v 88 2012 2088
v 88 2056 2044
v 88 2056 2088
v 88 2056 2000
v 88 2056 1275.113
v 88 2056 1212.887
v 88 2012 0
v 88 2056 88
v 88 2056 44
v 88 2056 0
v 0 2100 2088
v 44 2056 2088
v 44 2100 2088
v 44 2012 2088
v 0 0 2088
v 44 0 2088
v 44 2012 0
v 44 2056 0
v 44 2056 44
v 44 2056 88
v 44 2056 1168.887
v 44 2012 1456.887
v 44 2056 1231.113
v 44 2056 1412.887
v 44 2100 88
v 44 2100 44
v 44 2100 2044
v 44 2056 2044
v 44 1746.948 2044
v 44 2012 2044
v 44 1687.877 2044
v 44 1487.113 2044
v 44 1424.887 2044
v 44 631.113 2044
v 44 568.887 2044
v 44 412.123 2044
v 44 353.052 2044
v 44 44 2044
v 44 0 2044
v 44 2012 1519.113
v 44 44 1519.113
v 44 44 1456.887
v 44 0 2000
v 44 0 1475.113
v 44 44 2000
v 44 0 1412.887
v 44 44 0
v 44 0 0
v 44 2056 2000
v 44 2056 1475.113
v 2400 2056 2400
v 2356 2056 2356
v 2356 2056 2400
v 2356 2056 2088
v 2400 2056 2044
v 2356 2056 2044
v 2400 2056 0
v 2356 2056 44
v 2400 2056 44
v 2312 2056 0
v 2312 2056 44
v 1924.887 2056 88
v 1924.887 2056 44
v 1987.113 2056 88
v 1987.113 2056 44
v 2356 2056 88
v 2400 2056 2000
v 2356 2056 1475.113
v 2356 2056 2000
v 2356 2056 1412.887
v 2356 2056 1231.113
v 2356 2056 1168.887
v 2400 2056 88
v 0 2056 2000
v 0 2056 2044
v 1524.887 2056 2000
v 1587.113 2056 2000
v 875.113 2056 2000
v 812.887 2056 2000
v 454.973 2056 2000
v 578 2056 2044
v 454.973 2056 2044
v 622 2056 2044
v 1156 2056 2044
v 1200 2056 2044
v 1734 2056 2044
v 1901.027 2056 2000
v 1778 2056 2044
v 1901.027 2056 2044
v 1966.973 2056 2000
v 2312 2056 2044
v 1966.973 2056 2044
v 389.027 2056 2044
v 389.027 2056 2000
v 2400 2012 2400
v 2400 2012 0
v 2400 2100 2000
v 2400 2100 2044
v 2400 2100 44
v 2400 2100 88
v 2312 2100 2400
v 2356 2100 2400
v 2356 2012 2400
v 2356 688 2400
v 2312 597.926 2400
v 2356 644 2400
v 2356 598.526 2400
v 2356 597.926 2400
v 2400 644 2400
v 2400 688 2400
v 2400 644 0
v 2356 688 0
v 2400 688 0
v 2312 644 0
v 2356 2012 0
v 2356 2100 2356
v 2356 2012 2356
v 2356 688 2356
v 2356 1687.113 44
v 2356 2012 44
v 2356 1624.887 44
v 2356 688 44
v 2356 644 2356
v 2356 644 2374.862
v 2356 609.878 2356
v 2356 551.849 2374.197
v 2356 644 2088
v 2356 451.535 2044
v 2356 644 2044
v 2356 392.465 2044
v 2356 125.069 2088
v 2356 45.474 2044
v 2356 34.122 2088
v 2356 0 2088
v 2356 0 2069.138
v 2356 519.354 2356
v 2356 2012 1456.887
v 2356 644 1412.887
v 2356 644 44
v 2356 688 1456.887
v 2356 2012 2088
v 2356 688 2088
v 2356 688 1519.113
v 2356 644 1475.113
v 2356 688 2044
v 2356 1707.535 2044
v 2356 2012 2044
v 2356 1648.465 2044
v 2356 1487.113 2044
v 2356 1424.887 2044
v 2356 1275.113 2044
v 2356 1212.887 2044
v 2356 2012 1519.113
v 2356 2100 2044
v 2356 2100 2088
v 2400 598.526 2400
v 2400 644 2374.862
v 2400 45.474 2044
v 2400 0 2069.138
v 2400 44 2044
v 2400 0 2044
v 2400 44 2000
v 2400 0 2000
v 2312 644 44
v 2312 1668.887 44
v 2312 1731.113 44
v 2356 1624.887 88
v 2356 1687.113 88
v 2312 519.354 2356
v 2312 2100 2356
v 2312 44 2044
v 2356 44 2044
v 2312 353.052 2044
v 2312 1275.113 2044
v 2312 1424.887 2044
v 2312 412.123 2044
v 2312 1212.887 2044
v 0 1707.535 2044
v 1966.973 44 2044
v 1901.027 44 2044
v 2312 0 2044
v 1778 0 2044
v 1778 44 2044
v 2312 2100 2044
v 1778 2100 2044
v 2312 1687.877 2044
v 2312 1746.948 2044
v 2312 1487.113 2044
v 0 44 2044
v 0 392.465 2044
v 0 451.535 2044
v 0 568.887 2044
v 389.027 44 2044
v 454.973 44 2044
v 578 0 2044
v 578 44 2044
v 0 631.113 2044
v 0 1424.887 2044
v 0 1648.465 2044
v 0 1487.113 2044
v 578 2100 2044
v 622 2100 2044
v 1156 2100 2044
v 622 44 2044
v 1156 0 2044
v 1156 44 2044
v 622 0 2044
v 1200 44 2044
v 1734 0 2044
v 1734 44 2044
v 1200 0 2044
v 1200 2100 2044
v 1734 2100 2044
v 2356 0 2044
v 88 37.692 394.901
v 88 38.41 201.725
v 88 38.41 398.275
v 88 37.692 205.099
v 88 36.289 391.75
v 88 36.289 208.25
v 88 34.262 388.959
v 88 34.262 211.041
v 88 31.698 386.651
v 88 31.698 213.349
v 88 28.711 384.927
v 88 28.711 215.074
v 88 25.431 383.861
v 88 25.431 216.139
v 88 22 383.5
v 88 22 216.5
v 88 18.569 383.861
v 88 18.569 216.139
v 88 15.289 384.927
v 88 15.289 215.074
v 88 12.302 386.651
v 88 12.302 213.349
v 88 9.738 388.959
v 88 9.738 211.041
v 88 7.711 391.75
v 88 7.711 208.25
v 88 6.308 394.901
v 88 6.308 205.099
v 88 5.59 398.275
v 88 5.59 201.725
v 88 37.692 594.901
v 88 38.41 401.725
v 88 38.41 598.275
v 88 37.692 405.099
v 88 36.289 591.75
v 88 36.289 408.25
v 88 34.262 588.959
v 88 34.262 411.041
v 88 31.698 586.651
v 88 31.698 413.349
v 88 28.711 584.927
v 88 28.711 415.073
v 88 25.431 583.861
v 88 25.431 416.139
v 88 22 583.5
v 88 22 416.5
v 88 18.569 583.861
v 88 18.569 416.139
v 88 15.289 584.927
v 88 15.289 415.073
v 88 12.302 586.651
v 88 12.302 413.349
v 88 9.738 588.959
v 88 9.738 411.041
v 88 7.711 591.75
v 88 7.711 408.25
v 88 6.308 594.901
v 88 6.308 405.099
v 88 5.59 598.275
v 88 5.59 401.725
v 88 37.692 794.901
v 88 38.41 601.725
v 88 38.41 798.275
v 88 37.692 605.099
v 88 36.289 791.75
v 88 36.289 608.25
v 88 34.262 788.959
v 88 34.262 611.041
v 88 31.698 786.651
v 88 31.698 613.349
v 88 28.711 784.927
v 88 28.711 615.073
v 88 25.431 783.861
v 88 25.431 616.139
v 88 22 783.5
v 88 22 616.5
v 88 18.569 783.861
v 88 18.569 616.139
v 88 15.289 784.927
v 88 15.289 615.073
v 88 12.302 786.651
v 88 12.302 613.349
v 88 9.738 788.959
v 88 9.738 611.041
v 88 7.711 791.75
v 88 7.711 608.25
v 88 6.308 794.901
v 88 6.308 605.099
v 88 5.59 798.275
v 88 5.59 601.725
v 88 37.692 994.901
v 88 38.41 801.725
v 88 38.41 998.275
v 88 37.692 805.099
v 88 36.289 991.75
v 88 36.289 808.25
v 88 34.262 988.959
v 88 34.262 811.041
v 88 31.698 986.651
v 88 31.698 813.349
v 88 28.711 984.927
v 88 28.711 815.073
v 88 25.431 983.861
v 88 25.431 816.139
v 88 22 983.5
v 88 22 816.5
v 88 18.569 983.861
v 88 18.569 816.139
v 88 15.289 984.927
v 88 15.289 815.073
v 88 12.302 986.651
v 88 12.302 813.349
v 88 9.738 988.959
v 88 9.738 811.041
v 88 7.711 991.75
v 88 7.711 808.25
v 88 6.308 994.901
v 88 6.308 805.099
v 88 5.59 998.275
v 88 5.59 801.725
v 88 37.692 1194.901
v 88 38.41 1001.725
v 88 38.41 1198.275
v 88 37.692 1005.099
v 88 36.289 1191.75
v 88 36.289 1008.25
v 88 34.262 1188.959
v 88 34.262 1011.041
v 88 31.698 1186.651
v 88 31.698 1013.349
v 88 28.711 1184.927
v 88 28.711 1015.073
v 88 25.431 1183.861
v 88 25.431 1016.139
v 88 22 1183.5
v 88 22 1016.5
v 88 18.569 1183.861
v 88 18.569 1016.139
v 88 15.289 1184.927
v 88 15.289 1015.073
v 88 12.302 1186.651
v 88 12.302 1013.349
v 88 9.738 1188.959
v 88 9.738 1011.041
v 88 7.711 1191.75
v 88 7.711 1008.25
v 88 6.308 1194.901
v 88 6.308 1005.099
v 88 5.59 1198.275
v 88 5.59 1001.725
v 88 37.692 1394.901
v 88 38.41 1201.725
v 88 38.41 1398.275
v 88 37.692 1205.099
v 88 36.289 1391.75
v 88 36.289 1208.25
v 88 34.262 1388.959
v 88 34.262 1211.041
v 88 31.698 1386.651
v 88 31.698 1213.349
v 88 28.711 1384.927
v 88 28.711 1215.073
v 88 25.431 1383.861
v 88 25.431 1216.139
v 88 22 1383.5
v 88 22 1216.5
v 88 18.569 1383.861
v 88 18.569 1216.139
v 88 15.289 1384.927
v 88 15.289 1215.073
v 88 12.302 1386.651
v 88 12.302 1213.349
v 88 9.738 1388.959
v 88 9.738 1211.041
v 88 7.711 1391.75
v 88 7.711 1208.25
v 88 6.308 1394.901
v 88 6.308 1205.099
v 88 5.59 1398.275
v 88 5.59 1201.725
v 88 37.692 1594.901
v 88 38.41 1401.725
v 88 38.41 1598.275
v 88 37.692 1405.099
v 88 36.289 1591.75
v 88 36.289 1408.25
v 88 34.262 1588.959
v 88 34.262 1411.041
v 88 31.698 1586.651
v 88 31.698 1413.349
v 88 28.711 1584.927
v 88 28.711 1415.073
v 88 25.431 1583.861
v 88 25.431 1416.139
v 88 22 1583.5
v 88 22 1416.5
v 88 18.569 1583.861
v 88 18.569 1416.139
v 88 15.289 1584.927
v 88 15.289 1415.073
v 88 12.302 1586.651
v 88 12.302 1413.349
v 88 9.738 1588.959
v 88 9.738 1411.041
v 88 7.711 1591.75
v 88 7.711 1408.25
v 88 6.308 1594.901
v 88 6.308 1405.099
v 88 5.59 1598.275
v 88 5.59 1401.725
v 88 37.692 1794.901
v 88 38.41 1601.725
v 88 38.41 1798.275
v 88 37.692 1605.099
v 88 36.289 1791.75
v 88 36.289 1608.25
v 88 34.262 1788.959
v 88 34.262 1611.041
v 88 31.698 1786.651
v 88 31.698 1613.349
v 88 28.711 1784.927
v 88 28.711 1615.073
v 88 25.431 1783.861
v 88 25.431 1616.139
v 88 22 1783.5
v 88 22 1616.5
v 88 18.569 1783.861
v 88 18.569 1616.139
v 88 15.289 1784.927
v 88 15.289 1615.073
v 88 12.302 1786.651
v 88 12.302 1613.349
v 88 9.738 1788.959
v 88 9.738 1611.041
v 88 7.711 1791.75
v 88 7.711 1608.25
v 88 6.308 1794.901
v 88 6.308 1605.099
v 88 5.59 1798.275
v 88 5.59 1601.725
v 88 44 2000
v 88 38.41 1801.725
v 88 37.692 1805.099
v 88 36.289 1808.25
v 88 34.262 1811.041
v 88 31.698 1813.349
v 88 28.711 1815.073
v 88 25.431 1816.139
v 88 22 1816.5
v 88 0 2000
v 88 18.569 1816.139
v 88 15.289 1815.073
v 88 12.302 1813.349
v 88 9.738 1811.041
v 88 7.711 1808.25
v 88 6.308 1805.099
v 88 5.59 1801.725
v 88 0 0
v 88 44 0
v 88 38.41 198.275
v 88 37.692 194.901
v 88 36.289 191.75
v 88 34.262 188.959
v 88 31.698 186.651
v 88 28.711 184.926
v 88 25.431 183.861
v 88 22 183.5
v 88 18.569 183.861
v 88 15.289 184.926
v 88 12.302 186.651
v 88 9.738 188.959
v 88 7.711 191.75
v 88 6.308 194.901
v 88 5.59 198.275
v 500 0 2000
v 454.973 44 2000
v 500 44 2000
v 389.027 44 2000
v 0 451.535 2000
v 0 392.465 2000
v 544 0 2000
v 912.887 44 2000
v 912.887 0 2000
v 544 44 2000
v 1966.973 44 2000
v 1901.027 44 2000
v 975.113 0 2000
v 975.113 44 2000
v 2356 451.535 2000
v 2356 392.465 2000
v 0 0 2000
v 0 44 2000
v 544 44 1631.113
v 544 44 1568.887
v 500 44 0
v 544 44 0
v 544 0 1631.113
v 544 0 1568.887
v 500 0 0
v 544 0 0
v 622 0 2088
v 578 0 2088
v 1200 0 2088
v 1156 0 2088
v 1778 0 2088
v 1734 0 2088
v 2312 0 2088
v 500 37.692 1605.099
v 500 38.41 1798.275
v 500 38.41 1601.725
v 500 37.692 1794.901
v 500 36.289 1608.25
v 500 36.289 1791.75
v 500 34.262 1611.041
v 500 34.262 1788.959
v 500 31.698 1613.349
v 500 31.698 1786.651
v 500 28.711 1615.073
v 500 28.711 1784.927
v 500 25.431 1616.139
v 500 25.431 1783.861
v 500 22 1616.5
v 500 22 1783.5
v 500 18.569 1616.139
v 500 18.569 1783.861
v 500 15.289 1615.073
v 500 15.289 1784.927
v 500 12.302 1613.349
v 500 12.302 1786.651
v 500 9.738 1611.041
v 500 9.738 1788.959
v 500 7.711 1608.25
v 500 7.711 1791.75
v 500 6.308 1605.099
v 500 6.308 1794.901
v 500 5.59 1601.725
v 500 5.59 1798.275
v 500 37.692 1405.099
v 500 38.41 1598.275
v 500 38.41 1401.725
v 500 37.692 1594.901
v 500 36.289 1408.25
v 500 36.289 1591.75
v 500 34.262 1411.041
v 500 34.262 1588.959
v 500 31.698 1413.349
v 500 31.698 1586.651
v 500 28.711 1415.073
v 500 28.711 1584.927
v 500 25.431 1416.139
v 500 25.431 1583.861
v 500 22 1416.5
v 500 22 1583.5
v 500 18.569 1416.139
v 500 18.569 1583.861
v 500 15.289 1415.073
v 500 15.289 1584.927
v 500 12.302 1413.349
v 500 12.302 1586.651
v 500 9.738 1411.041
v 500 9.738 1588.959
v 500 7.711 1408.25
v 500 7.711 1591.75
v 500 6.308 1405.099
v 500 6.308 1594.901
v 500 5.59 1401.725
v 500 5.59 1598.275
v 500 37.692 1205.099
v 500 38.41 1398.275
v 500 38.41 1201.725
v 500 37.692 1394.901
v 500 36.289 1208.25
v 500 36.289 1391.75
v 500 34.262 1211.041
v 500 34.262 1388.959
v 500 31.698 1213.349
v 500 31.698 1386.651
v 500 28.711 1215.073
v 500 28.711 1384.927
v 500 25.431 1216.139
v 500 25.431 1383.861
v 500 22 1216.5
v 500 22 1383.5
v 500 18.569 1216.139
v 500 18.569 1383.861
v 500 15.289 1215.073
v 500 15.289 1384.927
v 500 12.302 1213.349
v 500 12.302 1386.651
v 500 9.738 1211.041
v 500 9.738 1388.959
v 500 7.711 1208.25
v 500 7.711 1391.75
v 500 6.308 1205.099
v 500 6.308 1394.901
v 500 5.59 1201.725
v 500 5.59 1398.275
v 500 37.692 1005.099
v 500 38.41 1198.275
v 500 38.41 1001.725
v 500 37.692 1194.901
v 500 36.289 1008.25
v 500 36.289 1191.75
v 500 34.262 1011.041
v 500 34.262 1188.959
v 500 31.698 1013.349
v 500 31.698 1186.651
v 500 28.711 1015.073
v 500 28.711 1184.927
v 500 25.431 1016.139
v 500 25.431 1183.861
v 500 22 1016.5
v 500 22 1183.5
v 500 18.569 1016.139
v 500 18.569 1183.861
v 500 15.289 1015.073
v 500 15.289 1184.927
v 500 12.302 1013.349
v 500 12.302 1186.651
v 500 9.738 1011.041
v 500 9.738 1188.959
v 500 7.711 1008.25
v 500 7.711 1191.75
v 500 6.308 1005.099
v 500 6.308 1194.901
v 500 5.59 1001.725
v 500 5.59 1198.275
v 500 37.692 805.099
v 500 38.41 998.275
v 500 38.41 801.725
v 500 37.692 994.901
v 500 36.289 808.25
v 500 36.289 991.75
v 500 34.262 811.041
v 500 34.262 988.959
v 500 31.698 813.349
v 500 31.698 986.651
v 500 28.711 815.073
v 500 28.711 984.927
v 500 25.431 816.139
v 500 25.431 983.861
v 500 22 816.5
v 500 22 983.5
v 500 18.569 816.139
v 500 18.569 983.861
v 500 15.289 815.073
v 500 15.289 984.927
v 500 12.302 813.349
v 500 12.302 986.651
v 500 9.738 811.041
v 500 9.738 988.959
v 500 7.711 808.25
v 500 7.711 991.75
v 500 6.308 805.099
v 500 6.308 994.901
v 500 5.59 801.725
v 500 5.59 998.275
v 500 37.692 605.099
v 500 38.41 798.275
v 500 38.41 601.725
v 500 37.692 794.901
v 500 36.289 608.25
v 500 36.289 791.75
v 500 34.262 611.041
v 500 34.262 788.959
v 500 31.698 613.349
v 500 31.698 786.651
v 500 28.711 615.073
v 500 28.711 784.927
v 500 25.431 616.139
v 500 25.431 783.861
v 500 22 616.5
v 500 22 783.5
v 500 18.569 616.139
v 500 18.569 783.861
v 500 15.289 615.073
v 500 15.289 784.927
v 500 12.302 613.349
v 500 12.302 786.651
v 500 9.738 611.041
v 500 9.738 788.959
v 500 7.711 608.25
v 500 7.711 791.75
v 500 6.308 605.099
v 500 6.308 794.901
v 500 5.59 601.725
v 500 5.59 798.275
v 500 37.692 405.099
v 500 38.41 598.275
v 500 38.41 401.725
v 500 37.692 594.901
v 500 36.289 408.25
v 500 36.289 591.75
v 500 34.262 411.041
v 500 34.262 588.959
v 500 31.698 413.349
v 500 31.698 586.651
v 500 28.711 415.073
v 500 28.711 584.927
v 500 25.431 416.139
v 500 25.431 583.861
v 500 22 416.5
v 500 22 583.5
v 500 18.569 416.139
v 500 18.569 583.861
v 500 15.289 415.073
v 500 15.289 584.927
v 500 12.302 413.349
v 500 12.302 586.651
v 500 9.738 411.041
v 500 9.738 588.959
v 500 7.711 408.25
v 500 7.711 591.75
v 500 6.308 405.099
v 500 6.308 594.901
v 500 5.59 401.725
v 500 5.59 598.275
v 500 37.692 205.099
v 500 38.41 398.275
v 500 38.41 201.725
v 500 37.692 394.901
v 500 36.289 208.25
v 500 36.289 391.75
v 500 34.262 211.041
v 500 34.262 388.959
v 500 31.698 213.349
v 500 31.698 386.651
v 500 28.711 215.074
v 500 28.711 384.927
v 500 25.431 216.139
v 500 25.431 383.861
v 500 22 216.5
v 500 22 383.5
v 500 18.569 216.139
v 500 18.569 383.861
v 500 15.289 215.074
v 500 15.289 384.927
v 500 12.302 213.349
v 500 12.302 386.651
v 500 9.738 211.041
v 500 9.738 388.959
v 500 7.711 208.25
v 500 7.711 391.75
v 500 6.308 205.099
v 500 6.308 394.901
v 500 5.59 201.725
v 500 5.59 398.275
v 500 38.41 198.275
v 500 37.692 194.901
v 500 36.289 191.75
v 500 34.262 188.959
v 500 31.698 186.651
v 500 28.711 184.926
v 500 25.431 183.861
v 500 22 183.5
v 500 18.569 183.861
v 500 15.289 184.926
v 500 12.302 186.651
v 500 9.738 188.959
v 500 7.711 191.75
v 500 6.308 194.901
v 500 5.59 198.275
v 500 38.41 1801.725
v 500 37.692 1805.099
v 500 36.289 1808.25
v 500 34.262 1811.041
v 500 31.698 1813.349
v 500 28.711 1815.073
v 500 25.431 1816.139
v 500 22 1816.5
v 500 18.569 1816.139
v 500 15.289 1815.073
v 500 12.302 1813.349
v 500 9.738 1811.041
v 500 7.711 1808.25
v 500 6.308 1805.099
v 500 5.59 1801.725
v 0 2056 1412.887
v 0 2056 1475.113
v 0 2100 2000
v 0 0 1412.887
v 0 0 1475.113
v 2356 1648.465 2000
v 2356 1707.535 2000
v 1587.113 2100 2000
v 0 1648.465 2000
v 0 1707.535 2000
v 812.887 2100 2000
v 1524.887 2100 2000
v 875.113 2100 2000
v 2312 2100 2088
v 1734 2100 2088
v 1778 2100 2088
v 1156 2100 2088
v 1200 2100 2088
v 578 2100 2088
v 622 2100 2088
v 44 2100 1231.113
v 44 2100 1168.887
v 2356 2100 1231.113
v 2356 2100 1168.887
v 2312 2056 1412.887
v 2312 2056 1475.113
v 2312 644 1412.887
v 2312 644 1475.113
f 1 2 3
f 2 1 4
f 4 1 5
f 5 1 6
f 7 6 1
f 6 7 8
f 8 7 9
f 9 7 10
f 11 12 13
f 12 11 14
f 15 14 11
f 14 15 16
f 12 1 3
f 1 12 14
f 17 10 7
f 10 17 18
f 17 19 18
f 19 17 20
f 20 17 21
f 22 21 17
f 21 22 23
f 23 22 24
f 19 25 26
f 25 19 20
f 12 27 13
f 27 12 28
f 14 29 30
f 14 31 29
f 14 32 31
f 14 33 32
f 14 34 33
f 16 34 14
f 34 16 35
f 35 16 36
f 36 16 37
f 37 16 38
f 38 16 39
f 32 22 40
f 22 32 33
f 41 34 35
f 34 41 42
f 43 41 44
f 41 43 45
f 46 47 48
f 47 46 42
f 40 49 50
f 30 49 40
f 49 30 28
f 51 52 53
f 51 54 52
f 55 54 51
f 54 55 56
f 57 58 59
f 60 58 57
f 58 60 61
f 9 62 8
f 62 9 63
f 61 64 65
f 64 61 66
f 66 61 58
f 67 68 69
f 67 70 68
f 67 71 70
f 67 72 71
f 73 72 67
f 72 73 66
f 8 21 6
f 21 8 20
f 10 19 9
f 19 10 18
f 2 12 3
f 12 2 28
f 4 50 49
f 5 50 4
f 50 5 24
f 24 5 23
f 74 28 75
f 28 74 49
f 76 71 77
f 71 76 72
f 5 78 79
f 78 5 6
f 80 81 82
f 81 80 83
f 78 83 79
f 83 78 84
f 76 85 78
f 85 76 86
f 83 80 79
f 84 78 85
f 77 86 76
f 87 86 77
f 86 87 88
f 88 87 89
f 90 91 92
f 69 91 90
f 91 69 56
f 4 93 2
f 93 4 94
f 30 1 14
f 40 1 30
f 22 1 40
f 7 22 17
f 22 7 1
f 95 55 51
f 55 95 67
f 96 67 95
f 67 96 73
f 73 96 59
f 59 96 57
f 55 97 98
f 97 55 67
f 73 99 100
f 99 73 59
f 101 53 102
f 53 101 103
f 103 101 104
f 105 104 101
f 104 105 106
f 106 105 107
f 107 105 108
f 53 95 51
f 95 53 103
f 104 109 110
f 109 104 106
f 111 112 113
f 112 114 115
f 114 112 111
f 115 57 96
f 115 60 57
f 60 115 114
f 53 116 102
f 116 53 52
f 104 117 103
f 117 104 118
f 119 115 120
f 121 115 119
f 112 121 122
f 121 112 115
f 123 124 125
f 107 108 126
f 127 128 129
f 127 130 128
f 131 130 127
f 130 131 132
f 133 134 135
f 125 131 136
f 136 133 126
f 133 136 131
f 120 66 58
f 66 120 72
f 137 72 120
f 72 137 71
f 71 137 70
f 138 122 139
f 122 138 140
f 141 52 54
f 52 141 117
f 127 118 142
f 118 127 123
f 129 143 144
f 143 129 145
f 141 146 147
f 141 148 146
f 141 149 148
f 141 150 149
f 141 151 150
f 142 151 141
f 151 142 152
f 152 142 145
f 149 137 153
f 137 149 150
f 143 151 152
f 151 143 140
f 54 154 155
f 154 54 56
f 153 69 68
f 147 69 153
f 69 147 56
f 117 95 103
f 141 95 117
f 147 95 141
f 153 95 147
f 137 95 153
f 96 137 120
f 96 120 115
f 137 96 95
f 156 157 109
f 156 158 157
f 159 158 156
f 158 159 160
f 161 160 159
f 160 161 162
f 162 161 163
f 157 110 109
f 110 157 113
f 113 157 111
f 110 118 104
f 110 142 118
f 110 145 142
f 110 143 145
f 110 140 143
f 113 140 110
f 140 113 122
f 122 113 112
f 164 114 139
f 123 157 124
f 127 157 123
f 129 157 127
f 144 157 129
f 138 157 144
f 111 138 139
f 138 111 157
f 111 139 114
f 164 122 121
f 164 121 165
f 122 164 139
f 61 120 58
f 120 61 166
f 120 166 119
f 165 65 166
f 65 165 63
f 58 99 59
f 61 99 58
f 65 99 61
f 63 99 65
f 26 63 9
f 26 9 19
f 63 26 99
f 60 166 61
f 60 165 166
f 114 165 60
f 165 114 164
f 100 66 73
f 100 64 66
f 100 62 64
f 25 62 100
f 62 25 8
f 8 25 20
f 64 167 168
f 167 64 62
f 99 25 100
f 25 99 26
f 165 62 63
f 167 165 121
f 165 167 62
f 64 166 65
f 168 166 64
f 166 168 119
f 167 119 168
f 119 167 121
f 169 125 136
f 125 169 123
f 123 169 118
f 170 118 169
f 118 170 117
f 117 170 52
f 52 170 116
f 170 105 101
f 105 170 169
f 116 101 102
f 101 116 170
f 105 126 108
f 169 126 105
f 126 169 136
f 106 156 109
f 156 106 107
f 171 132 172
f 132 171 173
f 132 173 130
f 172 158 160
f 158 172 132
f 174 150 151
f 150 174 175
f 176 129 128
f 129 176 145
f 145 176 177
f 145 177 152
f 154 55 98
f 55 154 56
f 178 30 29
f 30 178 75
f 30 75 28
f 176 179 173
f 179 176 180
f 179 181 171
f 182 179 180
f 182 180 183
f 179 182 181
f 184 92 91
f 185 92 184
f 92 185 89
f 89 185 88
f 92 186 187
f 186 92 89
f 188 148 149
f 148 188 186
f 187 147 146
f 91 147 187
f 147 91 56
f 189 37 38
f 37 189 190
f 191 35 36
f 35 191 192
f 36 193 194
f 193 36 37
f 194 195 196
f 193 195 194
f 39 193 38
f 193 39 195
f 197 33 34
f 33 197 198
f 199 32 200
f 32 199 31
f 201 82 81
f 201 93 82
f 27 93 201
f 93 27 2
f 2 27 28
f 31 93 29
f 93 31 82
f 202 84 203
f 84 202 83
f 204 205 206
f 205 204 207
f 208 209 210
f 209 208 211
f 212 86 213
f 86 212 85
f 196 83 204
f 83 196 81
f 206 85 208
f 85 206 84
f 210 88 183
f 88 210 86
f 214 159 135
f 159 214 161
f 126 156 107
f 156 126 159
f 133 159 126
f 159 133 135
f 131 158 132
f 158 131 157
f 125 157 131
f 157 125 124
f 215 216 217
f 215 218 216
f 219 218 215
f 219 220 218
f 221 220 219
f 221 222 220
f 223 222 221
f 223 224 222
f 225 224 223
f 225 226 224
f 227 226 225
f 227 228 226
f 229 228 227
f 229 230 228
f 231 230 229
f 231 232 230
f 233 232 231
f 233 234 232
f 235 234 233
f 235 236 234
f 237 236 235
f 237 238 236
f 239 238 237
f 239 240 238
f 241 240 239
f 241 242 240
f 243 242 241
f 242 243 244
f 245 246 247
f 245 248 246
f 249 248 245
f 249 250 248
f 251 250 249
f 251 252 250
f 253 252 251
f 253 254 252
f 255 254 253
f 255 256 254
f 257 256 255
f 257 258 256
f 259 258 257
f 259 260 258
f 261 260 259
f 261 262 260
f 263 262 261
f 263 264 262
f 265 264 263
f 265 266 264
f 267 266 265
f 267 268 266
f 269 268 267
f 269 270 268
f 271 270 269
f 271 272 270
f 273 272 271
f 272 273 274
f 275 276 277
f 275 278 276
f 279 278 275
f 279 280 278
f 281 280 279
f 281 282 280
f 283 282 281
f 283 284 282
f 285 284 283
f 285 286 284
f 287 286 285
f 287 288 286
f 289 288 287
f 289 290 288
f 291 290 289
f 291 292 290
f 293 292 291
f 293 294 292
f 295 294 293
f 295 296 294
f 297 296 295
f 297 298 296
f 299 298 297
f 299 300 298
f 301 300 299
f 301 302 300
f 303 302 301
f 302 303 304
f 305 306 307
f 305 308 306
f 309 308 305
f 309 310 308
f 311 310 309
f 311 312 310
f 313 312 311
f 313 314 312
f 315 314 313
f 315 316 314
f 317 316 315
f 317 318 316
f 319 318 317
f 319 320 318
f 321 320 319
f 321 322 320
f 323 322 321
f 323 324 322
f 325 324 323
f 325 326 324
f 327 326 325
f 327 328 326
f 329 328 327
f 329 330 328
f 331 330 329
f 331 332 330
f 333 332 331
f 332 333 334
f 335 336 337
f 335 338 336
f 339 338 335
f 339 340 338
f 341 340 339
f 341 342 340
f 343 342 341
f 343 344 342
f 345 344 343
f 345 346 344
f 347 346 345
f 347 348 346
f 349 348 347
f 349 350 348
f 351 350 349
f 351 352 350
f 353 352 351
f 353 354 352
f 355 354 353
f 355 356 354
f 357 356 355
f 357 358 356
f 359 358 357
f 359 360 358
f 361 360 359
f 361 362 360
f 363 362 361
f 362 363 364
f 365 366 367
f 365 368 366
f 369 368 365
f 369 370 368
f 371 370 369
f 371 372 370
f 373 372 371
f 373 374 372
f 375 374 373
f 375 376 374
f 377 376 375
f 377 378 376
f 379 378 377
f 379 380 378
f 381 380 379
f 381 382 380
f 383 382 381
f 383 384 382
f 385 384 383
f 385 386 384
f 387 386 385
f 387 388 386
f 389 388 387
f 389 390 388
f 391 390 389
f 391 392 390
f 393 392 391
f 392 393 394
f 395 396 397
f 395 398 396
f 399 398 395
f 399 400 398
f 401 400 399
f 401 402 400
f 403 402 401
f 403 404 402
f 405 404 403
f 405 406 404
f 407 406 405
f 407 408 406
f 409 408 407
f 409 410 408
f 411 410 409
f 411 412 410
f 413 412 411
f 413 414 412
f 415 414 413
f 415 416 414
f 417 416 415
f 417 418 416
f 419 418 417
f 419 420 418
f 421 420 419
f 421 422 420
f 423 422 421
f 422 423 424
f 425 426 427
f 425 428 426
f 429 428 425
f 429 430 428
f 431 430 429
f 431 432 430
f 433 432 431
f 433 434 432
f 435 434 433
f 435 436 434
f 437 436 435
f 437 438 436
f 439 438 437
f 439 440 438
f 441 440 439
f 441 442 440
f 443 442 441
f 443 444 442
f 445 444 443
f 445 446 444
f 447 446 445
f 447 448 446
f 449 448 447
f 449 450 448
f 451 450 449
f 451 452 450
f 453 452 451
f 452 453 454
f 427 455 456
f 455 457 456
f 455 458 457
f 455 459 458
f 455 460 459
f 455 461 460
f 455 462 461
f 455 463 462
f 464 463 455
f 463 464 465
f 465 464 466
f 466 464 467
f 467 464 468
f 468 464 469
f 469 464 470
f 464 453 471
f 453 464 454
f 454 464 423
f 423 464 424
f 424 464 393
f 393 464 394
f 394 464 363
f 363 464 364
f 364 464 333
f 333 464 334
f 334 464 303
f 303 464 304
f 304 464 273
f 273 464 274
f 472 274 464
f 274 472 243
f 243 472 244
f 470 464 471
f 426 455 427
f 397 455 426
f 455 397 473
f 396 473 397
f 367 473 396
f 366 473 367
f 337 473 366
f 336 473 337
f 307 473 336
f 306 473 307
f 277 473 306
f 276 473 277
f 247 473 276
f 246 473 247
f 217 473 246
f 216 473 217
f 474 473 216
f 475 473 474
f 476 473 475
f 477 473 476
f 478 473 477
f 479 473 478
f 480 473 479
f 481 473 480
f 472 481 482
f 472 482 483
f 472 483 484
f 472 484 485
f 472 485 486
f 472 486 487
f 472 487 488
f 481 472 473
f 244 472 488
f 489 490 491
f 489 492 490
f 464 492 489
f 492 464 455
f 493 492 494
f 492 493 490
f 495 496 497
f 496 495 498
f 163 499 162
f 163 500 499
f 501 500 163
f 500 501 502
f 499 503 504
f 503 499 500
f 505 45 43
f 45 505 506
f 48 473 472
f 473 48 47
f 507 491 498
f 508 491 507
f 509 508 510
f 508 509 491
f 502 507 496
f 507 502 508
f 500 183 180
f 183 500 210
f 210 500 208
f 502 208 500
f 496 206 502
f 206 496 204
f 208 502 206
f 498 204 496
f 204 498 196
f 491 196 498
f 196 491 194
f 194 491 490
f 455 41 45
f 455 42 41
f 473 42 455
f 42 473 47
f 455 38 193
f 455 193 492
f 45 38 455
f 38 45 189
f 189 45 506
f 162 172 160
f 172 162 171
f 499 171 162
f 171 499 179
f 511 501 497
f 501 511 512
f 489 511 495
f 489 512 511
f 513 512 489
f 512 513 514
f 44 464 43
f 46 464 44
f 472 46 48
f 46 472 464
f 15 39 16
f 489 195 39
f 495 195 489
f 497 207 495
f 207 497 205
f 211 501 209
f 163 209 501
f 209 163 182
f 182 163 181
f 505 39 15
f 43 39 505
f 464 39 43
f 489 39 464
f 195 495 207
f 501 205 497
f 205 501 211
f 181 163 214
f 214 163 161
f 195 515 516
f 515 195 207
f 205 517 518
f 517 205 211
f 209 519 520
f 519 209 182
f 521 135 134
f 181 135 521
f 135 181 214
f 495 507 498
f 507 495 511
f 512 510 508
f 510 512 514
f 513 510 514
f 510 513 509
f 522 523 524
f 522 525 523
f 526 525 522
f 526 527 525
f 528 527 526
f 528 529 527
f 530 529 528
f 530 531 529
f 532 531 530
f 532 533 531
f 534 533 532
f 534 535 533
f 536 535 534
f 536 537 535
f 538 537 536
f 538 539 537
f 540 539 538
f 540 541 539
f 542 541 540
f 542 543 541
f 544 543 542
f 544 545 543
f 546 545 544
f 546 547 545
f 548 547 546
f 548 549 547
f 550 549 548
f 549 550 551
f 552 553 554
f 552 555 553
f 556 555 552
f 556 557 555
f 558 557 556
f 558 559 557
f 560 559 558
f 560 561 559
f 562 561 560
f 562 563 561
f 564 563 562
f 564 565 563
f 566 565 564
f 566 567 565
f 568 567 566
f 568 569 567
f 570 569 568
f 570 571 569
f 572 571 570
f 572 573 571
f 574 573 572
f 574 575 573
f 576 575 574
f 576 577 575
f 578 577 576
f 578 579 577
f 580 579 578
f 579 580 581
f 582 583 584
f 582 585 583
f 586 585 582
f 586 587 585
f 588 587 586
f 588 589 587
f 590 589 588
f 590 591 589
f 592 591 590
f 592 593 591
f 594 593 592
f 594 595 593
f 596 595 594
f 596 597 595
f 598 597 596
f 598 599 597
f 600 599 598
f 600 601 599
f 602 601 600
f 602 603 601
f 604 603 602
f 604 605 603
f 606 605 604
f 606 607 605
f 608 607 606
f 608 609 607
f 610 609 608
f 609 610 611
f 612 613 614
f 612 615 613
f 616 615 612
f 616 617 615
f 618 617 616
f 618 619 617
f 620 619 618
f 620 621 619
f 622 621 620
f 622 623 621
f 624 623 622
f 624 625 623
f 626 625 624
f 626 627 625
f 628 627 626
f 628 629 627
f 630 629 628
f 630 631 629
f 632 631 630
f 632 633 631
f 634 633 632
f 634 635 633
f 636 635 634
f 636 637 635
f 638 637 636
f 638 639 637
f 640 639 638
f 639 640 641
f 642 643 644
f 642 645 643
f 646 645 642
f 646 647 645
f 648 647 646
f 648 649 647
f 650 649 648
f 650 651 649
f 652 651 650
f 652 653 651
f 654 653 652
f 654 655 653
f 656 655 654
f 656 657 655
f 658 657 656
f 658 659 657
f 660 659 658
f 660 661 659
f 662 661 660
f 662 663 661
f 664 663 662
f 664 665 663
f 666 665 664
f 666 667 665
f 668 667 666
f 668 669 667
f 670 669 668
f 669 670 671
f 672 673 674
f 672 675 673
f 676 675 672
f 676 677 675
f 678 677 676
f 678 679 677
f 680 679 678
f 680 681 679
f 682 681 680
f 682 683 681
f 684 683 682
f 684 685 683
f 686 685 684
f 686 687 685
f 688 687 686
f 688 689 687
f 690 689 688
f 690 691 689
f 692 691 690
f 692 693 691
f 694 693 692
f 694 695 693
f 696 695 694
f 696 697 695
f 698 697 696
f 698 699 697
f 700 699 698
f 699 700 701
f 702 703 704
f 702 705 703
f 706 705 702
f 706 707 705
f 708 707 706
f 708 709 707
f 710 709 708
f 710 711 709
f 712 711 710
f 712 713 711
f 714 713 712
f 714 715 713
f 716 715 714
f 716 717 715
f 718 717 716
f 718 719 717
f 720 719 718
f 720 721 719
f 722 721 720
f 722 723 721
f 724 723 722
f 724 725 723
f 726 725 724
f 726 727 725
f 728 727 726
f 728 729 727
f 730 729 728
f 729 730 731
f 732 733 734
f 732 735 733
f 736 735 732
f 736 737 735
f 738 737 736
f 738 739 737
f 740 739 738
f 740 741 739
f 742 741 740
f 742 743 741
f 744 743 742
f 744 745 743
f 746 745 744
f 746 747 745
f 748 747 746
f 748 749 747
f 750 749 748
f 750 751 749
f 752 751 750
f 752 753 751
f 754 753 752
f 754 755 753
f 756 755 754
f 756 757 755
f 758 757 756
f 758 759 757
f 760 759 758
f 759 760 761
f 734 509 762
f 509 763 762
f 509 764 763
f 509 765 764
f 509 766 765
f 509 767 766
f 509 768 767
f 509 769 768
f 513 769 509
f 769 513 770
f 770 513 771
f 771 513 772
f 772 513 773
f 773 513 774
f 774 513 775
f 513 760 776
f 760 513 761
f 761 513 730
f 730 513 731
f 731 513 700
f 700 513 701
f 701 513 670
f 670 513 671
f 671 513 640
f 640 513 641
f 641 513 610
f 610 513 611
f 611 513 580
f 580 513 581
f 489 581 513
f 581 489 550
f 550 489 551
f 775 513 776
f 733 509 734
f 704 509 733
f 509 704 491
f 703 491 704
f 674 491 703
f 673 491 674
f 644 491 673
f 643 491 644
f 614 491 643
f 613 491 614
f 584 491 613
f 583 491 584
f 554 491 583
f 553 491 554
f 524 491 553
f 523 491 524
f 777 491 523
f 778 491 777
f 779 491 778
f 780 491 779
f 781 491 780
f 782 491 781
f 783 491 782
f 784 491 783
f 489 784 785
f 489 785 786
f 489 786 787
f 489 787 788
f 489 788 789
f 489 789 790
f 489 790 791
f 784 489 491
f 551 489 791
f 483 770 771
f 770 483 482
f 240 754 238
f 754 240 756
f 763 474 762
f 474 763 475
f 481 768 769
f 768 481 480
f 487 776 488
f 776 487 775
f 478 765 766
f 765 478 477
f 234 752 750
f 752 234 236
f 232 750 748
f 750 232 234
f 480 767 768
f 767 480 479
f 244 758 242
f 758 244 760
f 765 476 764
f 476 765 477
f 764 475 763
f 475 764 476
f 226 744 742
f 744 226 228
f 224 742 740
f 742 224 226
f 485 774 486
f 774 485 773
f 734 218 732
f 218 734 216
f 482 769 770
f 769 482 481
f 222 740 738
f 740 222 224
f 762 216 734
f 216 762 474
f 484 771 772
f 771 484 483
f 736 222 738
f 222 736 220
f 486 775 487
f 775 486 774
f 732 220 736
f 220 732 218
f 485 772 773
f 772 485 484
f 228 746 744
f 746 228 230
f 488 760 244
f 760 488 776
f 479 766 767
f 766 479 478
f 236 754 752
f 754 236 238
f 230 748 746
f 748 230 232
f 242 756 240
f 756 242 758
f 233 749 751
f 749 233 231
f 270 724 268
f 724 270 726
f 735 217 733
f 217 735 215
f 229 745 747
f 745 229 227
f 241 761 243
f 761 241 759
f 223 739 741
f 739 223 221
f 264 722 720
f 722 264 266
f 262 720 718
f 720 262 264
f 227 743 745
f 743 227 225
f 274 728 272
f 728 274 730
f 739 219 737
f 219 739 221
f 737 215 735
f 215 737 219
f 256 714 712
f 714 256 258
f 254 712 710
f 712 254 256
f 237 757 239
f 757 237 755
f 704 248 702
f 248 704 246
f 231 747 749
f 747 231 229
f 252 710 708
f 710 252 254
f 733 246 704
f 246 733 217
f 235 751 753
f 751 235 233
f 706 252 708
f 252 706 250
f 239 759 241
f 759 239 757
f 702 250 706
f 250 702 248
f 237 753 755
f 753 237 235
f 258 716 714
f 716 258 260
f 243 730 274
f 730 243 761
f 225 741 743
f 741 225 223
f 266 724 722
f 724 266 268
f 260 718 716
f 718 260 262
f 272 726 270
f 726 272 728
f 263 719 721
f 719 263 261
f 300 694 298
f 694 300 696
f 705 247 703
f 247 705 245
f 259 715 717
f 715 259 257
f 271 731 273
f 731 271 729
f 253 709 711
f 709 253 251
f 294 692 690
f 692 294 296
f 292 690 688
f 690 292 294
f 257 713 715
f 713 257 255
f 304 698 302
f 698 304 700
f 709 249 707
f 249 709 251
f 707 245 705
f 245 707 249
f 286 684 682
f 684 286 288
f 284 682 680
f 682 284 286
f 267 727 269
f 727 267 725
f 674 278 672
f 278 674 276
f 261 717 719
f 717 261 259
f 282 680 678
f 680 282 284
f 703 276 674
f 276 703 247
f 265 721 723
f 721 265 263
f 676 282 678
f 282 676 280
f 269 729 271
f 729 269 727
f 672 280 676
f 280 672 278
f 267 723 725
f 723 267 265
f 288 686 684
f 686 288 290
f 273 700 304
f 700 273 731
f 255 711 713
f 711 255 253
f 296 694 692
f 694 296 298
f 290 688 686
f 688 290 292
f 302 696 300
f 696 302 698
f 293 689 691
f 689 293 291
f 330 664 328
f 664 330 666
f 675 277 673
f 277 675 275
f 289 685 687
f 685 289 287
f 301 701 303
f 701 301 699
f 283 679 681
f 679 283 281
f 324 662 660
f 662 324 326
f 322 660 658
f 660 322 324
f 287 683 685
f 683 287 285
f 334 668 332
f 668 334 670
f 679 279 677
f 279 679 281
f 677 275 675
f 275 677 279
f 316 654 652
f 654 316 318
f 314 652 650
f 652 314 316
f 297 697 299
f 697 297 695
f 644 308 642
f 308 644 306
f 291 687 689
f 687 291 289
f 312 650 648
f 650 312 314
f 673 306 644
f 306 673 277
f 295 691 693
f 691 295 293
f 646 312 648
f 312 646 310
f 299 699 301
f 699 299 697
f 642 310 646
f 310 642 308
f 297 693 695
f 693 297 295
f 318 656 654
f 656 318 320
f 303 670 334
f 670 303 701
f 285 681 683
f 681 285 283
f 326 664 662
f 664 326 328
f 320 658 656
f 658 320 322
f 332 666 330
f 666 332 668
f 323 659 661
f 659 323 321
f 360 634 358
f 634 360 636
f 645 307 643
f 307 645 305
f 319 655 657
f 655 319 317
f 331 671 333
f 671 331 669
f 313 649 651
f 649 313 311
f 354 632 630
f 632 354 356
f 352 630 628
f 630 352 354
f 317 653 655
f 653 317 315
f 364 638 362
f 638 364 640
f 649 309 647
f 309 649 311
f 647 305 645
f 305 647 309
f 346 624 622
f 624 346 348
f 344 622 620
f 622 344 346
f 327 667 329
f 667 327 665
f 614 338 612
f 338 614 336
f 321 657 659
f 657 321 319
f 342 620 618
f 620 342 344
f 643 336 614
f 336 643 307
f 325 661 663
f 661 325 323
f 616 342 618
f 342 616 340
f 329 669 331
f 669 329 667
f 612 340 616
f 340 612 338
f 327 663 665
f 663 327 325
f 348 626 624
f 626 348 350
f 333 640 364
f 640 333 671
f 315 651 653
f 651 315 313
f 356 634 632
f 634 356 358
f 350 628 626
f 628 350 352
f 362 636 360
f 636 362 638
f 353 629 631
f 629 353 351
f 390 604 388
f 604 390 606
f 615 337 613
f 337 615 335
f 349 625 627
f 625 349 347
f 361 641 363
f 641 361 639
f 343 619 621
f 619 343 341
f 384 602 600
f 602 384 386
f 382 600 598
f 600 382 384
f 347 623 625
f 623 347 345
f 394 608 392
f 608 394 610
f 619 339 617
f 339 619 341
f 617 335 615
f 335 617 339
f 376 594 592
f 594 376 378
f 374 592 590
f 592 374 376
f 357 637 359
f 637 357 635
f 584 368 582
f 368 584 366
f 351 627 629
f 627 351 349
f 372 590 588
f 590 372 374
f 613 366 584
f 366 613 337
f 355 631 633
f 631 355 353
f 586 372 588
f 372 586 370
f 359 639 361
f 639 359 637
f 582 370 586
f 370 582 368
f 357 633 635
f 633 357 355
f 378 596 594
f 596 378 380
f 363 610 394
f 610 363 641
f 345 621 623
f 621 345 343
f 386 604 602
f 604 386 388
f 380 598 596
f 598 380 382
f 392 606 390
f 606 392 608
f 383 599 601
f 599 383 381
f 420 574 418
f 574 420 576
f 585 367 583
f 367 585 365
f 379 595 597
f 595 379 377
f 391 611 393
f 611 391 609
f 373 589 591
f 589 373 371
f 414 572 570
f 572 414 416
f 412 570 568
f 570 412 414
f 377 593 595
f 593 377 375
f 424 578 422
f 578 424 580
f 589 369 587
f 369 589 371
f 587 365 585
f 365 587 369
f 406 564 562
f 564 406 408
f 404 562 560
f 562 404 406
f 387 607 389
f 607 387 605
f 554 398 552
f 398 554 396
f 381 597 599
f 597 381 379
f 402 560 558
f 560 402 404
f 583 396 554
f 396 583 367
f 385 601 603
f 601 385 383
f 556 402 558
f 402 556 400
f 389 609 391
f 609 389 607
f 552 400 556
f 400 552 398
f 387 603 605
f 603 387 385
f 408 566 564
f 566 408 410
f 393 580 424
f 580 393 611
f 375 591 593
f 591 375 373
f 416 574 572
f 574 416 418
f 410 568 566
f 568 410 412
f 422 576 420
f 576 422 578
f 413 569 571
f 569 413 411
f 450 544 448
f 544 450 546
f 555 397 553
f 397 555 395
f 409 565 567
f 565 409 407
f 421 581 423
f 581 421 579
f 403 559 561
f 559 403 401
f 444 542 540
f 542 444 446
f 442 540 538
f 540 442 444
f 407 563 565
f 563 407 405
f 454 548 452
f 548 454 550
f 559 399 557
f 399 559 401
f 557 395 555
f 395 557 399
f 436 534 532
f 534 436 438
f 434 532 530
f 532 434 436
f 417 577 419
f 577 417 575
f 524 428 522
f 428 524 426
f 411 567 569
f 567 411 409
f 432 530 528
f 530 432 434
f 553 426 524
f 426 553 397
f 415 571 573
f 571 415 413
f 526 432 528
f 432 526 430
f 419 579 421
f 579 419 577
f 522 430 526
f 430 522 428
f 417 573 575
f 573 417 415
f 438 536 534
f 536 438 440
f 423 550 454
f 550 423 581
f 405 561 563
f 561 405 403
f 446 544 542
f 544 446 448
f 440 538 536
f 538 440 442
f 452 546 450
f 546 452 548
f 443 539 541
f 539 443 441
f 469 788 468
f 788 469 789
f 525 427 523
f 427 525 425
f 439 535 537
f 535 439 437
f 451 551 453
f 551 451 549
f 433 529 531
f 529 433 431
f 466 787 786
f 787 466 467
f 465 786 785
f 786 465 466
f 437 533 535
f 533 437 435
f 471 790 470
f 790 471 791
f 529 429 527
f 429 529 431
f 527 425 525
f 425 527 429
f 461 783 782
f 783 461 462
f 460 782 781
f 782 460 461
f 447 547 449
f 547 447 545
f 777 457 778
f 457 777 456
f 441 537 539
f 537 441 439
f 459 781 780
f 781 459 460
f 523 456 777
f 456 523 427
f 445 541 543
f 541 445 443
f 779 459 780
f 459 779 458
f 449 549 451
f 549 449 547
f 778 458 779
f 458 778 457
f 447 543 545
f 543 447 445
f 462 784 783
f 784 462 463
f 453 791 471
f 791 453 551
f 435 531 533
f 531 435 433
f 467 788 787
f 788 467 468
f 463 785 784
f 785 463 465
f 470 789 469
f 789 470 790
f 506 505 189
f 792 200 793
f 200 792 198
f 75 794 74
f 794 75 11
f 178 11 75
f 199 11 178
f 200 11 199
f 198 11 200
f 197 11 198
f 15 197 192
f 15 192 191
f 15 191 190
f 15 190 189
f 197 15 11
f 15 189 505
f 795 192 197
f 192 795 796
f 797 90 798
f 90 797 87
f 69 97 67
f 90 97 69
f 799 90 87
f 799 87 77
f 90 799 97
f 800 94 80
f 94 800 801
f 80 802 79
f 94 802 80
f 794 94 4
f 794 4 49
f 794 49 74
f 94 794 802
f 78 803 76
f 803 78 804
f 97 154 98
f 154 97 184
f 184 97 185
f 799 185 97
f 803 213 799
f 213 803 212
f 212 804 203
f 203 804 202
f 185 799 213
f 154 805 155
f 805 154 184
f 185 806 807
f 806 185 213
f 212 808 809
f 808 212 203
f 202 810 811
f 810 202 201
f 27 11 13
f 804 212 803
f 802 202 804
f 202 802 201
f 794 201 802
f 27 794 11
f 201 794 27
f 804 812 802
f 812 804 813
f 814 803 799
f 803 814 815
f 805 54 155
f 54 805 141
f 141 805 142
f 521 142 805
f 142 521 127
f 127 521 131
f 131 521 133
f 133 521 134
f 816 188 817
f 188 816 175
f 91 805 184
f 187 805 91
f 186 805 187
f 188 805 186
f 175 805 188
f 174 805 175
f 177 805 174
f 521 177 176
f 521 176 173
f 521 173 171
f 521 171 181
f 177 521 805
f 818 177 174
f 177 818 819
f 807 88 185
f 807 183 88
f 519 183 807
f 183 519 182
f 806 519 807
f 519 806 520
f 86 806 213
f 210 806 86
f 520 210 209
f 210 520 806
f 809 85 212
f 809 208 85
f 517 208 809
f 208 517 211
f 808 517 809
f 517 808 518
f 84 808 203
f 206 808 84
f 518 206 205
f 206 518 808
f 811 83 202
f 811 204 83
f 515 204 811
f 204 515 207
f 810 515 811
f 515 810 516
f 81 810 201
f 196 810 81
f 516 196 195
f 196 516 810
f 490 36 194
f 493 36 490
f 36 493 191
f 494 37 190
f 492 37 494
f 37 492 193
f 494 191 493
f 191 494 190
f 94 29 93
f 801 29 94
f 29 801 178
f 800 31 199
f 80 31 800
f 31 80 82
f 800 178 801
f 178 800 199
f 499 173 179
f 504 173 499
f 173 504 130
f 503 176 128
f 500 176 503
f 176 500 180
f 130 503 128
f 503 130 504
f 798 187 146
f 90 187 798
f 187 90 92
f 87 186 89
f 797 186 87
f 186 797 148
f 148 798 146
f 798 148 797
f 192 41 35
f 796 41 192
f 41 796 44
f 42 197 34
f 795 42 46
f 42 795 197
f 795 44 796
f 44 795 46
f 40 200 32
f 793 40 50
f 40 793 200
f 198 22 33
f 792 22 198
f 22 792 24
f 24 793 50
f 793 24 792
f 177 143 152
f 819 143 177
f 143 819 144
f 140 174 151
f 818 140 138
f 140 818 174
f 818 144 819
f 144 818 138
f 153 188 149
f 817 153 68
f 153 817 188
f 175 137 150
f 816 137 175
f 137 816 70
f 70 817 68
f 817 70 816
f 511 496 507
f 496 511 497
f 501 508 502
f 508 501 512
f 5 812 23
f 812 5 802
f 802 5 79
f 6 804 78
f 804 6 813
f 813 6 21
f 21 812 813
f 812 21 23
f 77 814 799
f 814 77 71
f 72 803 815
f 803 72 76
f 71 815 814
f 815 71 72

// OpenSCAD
R =  [1, 0, 0];
L = -[1, 0, 0];
B =  [0, 1, 0];
F = -[0, 1, 0];
U =  [0, 0, 1];
D = -[0, 0, 1];

module showPoint(p) {
	# translate(p) sphere(30);
}

module simpleBar(w, d, xA=0, xB=0) {
	l = sqrt(d[0]^2 + d[1]^2 + d[2]^2);

	if (abs(d[0]) >= abs(d[1]) && abs(d[0]) >= abs(d[2])) {
		rotate([0, -atan2(d[2], sqrt(d[1]^2 + d[0]^2)), atan2(d[1], d[0])])
				translate([-xA, -w/2, -w/2]) cube([l+xA+xB, w, w]);
	} else
	if (abs(d[1]) >= abs(d[0]) && abs(d[1]) >= abs(d[2])) {
		rotate([atan2(d[2], sqrt(d[0]^2 + d[1]^2)), 0, -atan2(d[0], d[1])])
				translate([-w/2, -xA, -w/2]) cube([w, l+xA+xB, w]);
	} else {
		rotate([-atan2(d[1], sqrt(d[0]^2 + d[2]^2)), atan2(d[0], d[2]), 0])
				translate([-w/2, -w/2, -xA]) cube([w, w, l+xA+xB]);
	}
}

module bar(w, pA, pB, eA=[], eB=[], name = "UNNAMED") {
	d = pB - pA;
	l = sqrt(d[0]^2 + d[1]^2 + d[2]^2);

	x = 1000; // Large enough to effectively be a half-space
	xA = len(eA) ? x : 0;
	xB = len(eB) ? x : 0;

	translate(pA) render(convexity=1) difference() {
		simpleBar(w, d, xA, xB);

		for (i = [0:1:len(eA)-1])
			simpleBar(2*(x+w), (x+w)*eA[i]);

		for (i = [0:1:len(eB)-1])
			translate(d) simpleBar(2*(x+w), (x+w)*eB[i]);
	}

	echo(str("Bar ", name, ": length=", l));
}

module barTest() {
	for (p = [L, R, D, U, F, B]) {
		pA = 300 * p;  // showPoint(pA);
		pB = 600 * p;  // showPoint(pB);
		color([1.0, 0.5, 0.5]) bar(30, pA, pB, [], []);
	}

	for (alpha = [30, 60, 120, 150, 210, 240, 300, 330]) {
		p = [cos(alpha), sin(alpha), 0];
		pA = 300 * p;  // showPoint(pA);
		pB = 500 * p;  // showPoint(pB);
		color([1.0, 1.0, 0.3]) bar(20, pA, pB, [], []);
	}

	for (alpha = [30, 60, 120, 150, 210, 240, 300, 330]) {
		p = [cos(alpha), 0, sin(alpha)];
		pA = 300 * p;  // showPoint(pA);
		pB = 500 * p;  // showPoint(pB);
		color([1.0, 0.3, 1.0]) bar(20, pA, pB, [], []);
	}

	for (alpha = [30, 60, 120, 150, 210, 240, 300, 330]) {
		p = [0, cos(alpha), sin(alpha)];
		pA = 300 * p;  // showPoint(pA);
		pB = 500 * p;  // showPoint(pB);
		color([0.3, 1.0, 1.0]) bar(20, pA, pB, [], []);
	}

	for (pX = [-1, 1]/sqrt(3), pY = [-1, 1]/sqrt(3), pZ = [-1, 1]/sqrt(3)) {
		p = [pX, pY, pZ];
		pA = 300 * p;  // showPoint(pA);
		pB = 400 * p;  // showPoint(pB);
		color([0.5, 1.0, 0.5]) bar(40, pA, pB, [], []);
	}
}

// barTest();

w0 = 20;
w1 = 44;
w2 = 57;
W = 44;

c1 = [1.0, 0.8, 0.8];
c2 = [1.0, 1.0, 0.5];
c3 = [0.8, 0.8, 0.8];
c4 = [0.5, 0.8, 0.5];
c5 = [0.8, 0.5, 0.5, 0.2];
c6 = [0.5, 0.5, 0.8, 0.2];

height = 2000;
width = 2400;
depth = 2100;
indent = 600;
ladderWidth = 500;
strutSpan = 400;

origin = [0, 0, 0];
// showPoint(origin);

module foundation(O) {

	module ladder() {
		p1 = O + W/2*(R+B) + W*R;
		p2 = p1 + height*U;

		for (q = [0, ladderWidth-W])
			color(c1) translate(q*R) bar(W, p1, p2, [], [], "LADDER");

		N = 10;
		for (i = [1:9])
			color(c4) translate(W*R + W/2*(R+B) + i*height/N*U)
			rotate([0, 90, 0]) cylinder(ladderWidth - W, d=0.75*W);
	}

	module legs() {
		h = height + 2*W;
		p1 =  O + 1.5*W*(R+B);
		p2 = p1 + (depth-3*W)*B;
		p3 = p2 + (width-2*W)*R;
		p4 = p3 + (depth-3*W-indent)*F;

		for (p = [p2])
			color(c3) bar(W, p, p + h*U, [], [], "LEG");

		for (p = [p3, p4])
			color(c3) bar(W, p, p + 2400*U, [], [], "LEG");

		// bottom struts
		p5 = p3 + W/2*(B+L+U) + W*U;
		color(c1) bar(W, p4 + W/2*(F+U) + W*L, p3 + W/2*(B+U) + W*L, [], [], "BOTTOM");
		color(c2) bar(W, p3 + W/2*(R+U) + W*(B+U), p2 + W/2*(L+U) + W*(B+U), [], [], "BOTTOM");
		color(c4) bar(W, p5 + strutSpan*F, p5 + strutSpan*L, [R], [B], "BOT_STRUT");

		// top frame
		p6 = p4 + 2400*U + W/2*(F+D) + W*L + 1.94*W*F;
		p7 = p3 + 2400*U + W/2*(B+D) + W*L + W*B;
		color(c1) bar(W, p6, p7, [0.56*F+U], [], "TOP_FRAME");
		
		// top strut
		p8 = p4 + 2400*U + W/2*F;
		p9 = O + width*R + height*U + W/2*L + W*U;
		bar(W, p8, p9, [B,U], [D, F], "TOP_FRAME");
	}

	module frame() {
		p1 = O + W/2*(U+B) + height*U;
		p2 = p1 + width*R;

		p1t = p1 + (depth-W)*B;
		p2t = p2 + (depth-W)*B;

		color(c2) bar(W, p1, p2, [], [], "FRAME");
		color(c2) bar(W, p1t, p2t, [], [], "FRAME");

		p3 = p1 + W*U + W/2*(F+R);
		p4 = p3 + depth*B;

		p3t = p3 + (width-2*W)*R;
		p4t = p4 + (width-2*W)*R;

		color(c1) bar(W, p3, p4, [], [], "FRAME");
		color(c1) bar(W, p3t, p4t, [], [], "FRAME");

		for (k = [0.25, 0.5, 0.75])
			color(c1) bar(W, k*p3 + (1-k)*p3t, k*p4 + (1-k)*p4t, [], [], "FRAME");

		// horizontal struts
		color(c4) bar(W, p1 + strutSpan*B, p3 + strutSpan*R + W*(B+D), [L], [F], "HORIZ_STRUT");
		color(c4) bar(W, p1t + strutSpan*F, p4 + strutSpan*R + W*(F+D), [L], [B], "HORIZ_STRUT");
		color(c4) bar(W, p2 + strutSpan*B + W*L, p3t + strutSpan*L + W*(B+D), [R], [F], "HORIZ_STRUT");
		color(c4) bar(W, p2t + strutSpan*F + W*L, p4t + strutSpan*L + W*(F+D), [R], [B], "HORIZ_STRUT");

		// vertical struts left and right
		p5 = p3 + W/2*D;
		p6 = p4 + W/2*D + W*F;
		p7 = p5 + (width-W)*R + (indent+W)*B + W*L;
		p8 = p6 + (width-W)*R + W*L;

		color(c4) bar(W, p5 + 1.5*strutSpan*D, p5 + 1.5*strutSpan*B, [F], [U], "VERT_STRUT");
		color(c4) bar(W, p6 + 1.5*strutSpan*D, p6 + 1.5*strutSpan*F, [B], [U], "VERT_STRUT");
		color(c4) bar(W, p7 + 1.5*strutSpan*D, p7 + 1.5*strutSpan*B, [F], [U], "VERT_STRUT");
		color(c4) bar(W, p8 + 1.5*strutSpan*D, p8 + 1.5*strutSpan*F, [B], [U], "VERT_STRUT");

		// vertical struts front and back
		p9 = p1 + W/2*D + (W+ladderWidth)*R;
		p10 = p1t + W/2*D + W*R;
		p11 = p2t + W/2*D + W*L;

		color(c4) bar(W, p9 + strutSpan*D, p9 + strutSpan*R, [L], [U], "VERT_STRUT");
		color(c4) bar(W, p10 + 2*strutSpan*D, p10 + 2*strutSpan*R, [L], [U], "VERT_STRUT");
		color(c4) bar(W, p11 + 2*strutSpan*D, p11 + 2*strutSpan*L, [R], [U], "VERT_STRUT");
	}

	legs();
	ladder();
	frame();
}

module horzgrid() {
	pLF = origin + w1/2*(R+U) + (height+w2)*U;
	pRF = pLF + (width-w1)*R;
	pLB = pLF + depth*B;
	pRB = pRF + depth*B;

	color(c1) bar(w1, pLF, pLB, [], []);
	color(c1) bar(w1, pRF, pRB, [], []);

	N = 6;
	d = (width-w1)/(N+1);

	for (i = [1:N]) {
		color(c3) bar(w1, pLF + (i*d)*R, pLB + (i*d)*R, [], []);
	}

	for (i = [0:N]) {
		color(c4) bar(w1, pLF + (i*d)*R + [w1/2, w1/2, 0], pLF + (i*d+d)*R + [-w1/2, w1/2, 0], [], []);
		color(c4) bar(w1, pLB + (i*d)*R + [w1/2, -w1/2, 0], pLB + (i*d+d)*R + [-w1/2, -w1/2, 0], [], []);
	}

	color(c2) bar(w1, pLF + [-w1/2, w1/2, w1], pRF + [w1/2, w1/2, w1], [], []);
	color(c2) bar(w1, pLB + [-w1/2, -w1/2, w1], pRB + [w1/2, -w1/2, w1], [], []);

	M = 8;
	gap = 50;

	for (i = [1:M]) {
		u = (i-1)*(depth-2*w1+gap)/M;
		v = i*(depth-2*w1+gap)/M - gap;
		p1 = pLF + u*B + [-w1/2, w1, w1/2];
		p2 = pLF + u*B + [-w1/2, w1, w1/2] + (2*d+w1/2)*R;
		p3 = pRF + u*B + [+w1/2, w1, w1/2] - (2*d+w1/2)*R;
		p4 = pRF + u*B + [+w1/2, w1, w1/2];

		color(i%2 ? c6 : c5) translate(p1) cube((p2-p1) + (v-u)*B + 20*U);
		color(i%2 ? c5 : c6) translate(p2) cube((p3-p2) + (v-u)*B + 20*U);
		color(i%2 ? c6 : c5) translate(p3) cube((p4-p3) + (v-u)*B + 20*U);

		if (i < M) {
			color(c4) translate(p1 + (v-u)*B) cube([w1, gap, 20]);
			color(c4) translate(p2 + (v-u)*B + w1/2*L) cube([w1, gap, 20]);
			color(c4) translate(p3 + (v-u)*B + w1/2*L) cube([w1, gap, 20]);
			color(c4) translate(p4 + (v-u)*B + w1*L) cube([w1, gap, 20]);
		}
	}
}

foundation(origin);
// horzgrid();
